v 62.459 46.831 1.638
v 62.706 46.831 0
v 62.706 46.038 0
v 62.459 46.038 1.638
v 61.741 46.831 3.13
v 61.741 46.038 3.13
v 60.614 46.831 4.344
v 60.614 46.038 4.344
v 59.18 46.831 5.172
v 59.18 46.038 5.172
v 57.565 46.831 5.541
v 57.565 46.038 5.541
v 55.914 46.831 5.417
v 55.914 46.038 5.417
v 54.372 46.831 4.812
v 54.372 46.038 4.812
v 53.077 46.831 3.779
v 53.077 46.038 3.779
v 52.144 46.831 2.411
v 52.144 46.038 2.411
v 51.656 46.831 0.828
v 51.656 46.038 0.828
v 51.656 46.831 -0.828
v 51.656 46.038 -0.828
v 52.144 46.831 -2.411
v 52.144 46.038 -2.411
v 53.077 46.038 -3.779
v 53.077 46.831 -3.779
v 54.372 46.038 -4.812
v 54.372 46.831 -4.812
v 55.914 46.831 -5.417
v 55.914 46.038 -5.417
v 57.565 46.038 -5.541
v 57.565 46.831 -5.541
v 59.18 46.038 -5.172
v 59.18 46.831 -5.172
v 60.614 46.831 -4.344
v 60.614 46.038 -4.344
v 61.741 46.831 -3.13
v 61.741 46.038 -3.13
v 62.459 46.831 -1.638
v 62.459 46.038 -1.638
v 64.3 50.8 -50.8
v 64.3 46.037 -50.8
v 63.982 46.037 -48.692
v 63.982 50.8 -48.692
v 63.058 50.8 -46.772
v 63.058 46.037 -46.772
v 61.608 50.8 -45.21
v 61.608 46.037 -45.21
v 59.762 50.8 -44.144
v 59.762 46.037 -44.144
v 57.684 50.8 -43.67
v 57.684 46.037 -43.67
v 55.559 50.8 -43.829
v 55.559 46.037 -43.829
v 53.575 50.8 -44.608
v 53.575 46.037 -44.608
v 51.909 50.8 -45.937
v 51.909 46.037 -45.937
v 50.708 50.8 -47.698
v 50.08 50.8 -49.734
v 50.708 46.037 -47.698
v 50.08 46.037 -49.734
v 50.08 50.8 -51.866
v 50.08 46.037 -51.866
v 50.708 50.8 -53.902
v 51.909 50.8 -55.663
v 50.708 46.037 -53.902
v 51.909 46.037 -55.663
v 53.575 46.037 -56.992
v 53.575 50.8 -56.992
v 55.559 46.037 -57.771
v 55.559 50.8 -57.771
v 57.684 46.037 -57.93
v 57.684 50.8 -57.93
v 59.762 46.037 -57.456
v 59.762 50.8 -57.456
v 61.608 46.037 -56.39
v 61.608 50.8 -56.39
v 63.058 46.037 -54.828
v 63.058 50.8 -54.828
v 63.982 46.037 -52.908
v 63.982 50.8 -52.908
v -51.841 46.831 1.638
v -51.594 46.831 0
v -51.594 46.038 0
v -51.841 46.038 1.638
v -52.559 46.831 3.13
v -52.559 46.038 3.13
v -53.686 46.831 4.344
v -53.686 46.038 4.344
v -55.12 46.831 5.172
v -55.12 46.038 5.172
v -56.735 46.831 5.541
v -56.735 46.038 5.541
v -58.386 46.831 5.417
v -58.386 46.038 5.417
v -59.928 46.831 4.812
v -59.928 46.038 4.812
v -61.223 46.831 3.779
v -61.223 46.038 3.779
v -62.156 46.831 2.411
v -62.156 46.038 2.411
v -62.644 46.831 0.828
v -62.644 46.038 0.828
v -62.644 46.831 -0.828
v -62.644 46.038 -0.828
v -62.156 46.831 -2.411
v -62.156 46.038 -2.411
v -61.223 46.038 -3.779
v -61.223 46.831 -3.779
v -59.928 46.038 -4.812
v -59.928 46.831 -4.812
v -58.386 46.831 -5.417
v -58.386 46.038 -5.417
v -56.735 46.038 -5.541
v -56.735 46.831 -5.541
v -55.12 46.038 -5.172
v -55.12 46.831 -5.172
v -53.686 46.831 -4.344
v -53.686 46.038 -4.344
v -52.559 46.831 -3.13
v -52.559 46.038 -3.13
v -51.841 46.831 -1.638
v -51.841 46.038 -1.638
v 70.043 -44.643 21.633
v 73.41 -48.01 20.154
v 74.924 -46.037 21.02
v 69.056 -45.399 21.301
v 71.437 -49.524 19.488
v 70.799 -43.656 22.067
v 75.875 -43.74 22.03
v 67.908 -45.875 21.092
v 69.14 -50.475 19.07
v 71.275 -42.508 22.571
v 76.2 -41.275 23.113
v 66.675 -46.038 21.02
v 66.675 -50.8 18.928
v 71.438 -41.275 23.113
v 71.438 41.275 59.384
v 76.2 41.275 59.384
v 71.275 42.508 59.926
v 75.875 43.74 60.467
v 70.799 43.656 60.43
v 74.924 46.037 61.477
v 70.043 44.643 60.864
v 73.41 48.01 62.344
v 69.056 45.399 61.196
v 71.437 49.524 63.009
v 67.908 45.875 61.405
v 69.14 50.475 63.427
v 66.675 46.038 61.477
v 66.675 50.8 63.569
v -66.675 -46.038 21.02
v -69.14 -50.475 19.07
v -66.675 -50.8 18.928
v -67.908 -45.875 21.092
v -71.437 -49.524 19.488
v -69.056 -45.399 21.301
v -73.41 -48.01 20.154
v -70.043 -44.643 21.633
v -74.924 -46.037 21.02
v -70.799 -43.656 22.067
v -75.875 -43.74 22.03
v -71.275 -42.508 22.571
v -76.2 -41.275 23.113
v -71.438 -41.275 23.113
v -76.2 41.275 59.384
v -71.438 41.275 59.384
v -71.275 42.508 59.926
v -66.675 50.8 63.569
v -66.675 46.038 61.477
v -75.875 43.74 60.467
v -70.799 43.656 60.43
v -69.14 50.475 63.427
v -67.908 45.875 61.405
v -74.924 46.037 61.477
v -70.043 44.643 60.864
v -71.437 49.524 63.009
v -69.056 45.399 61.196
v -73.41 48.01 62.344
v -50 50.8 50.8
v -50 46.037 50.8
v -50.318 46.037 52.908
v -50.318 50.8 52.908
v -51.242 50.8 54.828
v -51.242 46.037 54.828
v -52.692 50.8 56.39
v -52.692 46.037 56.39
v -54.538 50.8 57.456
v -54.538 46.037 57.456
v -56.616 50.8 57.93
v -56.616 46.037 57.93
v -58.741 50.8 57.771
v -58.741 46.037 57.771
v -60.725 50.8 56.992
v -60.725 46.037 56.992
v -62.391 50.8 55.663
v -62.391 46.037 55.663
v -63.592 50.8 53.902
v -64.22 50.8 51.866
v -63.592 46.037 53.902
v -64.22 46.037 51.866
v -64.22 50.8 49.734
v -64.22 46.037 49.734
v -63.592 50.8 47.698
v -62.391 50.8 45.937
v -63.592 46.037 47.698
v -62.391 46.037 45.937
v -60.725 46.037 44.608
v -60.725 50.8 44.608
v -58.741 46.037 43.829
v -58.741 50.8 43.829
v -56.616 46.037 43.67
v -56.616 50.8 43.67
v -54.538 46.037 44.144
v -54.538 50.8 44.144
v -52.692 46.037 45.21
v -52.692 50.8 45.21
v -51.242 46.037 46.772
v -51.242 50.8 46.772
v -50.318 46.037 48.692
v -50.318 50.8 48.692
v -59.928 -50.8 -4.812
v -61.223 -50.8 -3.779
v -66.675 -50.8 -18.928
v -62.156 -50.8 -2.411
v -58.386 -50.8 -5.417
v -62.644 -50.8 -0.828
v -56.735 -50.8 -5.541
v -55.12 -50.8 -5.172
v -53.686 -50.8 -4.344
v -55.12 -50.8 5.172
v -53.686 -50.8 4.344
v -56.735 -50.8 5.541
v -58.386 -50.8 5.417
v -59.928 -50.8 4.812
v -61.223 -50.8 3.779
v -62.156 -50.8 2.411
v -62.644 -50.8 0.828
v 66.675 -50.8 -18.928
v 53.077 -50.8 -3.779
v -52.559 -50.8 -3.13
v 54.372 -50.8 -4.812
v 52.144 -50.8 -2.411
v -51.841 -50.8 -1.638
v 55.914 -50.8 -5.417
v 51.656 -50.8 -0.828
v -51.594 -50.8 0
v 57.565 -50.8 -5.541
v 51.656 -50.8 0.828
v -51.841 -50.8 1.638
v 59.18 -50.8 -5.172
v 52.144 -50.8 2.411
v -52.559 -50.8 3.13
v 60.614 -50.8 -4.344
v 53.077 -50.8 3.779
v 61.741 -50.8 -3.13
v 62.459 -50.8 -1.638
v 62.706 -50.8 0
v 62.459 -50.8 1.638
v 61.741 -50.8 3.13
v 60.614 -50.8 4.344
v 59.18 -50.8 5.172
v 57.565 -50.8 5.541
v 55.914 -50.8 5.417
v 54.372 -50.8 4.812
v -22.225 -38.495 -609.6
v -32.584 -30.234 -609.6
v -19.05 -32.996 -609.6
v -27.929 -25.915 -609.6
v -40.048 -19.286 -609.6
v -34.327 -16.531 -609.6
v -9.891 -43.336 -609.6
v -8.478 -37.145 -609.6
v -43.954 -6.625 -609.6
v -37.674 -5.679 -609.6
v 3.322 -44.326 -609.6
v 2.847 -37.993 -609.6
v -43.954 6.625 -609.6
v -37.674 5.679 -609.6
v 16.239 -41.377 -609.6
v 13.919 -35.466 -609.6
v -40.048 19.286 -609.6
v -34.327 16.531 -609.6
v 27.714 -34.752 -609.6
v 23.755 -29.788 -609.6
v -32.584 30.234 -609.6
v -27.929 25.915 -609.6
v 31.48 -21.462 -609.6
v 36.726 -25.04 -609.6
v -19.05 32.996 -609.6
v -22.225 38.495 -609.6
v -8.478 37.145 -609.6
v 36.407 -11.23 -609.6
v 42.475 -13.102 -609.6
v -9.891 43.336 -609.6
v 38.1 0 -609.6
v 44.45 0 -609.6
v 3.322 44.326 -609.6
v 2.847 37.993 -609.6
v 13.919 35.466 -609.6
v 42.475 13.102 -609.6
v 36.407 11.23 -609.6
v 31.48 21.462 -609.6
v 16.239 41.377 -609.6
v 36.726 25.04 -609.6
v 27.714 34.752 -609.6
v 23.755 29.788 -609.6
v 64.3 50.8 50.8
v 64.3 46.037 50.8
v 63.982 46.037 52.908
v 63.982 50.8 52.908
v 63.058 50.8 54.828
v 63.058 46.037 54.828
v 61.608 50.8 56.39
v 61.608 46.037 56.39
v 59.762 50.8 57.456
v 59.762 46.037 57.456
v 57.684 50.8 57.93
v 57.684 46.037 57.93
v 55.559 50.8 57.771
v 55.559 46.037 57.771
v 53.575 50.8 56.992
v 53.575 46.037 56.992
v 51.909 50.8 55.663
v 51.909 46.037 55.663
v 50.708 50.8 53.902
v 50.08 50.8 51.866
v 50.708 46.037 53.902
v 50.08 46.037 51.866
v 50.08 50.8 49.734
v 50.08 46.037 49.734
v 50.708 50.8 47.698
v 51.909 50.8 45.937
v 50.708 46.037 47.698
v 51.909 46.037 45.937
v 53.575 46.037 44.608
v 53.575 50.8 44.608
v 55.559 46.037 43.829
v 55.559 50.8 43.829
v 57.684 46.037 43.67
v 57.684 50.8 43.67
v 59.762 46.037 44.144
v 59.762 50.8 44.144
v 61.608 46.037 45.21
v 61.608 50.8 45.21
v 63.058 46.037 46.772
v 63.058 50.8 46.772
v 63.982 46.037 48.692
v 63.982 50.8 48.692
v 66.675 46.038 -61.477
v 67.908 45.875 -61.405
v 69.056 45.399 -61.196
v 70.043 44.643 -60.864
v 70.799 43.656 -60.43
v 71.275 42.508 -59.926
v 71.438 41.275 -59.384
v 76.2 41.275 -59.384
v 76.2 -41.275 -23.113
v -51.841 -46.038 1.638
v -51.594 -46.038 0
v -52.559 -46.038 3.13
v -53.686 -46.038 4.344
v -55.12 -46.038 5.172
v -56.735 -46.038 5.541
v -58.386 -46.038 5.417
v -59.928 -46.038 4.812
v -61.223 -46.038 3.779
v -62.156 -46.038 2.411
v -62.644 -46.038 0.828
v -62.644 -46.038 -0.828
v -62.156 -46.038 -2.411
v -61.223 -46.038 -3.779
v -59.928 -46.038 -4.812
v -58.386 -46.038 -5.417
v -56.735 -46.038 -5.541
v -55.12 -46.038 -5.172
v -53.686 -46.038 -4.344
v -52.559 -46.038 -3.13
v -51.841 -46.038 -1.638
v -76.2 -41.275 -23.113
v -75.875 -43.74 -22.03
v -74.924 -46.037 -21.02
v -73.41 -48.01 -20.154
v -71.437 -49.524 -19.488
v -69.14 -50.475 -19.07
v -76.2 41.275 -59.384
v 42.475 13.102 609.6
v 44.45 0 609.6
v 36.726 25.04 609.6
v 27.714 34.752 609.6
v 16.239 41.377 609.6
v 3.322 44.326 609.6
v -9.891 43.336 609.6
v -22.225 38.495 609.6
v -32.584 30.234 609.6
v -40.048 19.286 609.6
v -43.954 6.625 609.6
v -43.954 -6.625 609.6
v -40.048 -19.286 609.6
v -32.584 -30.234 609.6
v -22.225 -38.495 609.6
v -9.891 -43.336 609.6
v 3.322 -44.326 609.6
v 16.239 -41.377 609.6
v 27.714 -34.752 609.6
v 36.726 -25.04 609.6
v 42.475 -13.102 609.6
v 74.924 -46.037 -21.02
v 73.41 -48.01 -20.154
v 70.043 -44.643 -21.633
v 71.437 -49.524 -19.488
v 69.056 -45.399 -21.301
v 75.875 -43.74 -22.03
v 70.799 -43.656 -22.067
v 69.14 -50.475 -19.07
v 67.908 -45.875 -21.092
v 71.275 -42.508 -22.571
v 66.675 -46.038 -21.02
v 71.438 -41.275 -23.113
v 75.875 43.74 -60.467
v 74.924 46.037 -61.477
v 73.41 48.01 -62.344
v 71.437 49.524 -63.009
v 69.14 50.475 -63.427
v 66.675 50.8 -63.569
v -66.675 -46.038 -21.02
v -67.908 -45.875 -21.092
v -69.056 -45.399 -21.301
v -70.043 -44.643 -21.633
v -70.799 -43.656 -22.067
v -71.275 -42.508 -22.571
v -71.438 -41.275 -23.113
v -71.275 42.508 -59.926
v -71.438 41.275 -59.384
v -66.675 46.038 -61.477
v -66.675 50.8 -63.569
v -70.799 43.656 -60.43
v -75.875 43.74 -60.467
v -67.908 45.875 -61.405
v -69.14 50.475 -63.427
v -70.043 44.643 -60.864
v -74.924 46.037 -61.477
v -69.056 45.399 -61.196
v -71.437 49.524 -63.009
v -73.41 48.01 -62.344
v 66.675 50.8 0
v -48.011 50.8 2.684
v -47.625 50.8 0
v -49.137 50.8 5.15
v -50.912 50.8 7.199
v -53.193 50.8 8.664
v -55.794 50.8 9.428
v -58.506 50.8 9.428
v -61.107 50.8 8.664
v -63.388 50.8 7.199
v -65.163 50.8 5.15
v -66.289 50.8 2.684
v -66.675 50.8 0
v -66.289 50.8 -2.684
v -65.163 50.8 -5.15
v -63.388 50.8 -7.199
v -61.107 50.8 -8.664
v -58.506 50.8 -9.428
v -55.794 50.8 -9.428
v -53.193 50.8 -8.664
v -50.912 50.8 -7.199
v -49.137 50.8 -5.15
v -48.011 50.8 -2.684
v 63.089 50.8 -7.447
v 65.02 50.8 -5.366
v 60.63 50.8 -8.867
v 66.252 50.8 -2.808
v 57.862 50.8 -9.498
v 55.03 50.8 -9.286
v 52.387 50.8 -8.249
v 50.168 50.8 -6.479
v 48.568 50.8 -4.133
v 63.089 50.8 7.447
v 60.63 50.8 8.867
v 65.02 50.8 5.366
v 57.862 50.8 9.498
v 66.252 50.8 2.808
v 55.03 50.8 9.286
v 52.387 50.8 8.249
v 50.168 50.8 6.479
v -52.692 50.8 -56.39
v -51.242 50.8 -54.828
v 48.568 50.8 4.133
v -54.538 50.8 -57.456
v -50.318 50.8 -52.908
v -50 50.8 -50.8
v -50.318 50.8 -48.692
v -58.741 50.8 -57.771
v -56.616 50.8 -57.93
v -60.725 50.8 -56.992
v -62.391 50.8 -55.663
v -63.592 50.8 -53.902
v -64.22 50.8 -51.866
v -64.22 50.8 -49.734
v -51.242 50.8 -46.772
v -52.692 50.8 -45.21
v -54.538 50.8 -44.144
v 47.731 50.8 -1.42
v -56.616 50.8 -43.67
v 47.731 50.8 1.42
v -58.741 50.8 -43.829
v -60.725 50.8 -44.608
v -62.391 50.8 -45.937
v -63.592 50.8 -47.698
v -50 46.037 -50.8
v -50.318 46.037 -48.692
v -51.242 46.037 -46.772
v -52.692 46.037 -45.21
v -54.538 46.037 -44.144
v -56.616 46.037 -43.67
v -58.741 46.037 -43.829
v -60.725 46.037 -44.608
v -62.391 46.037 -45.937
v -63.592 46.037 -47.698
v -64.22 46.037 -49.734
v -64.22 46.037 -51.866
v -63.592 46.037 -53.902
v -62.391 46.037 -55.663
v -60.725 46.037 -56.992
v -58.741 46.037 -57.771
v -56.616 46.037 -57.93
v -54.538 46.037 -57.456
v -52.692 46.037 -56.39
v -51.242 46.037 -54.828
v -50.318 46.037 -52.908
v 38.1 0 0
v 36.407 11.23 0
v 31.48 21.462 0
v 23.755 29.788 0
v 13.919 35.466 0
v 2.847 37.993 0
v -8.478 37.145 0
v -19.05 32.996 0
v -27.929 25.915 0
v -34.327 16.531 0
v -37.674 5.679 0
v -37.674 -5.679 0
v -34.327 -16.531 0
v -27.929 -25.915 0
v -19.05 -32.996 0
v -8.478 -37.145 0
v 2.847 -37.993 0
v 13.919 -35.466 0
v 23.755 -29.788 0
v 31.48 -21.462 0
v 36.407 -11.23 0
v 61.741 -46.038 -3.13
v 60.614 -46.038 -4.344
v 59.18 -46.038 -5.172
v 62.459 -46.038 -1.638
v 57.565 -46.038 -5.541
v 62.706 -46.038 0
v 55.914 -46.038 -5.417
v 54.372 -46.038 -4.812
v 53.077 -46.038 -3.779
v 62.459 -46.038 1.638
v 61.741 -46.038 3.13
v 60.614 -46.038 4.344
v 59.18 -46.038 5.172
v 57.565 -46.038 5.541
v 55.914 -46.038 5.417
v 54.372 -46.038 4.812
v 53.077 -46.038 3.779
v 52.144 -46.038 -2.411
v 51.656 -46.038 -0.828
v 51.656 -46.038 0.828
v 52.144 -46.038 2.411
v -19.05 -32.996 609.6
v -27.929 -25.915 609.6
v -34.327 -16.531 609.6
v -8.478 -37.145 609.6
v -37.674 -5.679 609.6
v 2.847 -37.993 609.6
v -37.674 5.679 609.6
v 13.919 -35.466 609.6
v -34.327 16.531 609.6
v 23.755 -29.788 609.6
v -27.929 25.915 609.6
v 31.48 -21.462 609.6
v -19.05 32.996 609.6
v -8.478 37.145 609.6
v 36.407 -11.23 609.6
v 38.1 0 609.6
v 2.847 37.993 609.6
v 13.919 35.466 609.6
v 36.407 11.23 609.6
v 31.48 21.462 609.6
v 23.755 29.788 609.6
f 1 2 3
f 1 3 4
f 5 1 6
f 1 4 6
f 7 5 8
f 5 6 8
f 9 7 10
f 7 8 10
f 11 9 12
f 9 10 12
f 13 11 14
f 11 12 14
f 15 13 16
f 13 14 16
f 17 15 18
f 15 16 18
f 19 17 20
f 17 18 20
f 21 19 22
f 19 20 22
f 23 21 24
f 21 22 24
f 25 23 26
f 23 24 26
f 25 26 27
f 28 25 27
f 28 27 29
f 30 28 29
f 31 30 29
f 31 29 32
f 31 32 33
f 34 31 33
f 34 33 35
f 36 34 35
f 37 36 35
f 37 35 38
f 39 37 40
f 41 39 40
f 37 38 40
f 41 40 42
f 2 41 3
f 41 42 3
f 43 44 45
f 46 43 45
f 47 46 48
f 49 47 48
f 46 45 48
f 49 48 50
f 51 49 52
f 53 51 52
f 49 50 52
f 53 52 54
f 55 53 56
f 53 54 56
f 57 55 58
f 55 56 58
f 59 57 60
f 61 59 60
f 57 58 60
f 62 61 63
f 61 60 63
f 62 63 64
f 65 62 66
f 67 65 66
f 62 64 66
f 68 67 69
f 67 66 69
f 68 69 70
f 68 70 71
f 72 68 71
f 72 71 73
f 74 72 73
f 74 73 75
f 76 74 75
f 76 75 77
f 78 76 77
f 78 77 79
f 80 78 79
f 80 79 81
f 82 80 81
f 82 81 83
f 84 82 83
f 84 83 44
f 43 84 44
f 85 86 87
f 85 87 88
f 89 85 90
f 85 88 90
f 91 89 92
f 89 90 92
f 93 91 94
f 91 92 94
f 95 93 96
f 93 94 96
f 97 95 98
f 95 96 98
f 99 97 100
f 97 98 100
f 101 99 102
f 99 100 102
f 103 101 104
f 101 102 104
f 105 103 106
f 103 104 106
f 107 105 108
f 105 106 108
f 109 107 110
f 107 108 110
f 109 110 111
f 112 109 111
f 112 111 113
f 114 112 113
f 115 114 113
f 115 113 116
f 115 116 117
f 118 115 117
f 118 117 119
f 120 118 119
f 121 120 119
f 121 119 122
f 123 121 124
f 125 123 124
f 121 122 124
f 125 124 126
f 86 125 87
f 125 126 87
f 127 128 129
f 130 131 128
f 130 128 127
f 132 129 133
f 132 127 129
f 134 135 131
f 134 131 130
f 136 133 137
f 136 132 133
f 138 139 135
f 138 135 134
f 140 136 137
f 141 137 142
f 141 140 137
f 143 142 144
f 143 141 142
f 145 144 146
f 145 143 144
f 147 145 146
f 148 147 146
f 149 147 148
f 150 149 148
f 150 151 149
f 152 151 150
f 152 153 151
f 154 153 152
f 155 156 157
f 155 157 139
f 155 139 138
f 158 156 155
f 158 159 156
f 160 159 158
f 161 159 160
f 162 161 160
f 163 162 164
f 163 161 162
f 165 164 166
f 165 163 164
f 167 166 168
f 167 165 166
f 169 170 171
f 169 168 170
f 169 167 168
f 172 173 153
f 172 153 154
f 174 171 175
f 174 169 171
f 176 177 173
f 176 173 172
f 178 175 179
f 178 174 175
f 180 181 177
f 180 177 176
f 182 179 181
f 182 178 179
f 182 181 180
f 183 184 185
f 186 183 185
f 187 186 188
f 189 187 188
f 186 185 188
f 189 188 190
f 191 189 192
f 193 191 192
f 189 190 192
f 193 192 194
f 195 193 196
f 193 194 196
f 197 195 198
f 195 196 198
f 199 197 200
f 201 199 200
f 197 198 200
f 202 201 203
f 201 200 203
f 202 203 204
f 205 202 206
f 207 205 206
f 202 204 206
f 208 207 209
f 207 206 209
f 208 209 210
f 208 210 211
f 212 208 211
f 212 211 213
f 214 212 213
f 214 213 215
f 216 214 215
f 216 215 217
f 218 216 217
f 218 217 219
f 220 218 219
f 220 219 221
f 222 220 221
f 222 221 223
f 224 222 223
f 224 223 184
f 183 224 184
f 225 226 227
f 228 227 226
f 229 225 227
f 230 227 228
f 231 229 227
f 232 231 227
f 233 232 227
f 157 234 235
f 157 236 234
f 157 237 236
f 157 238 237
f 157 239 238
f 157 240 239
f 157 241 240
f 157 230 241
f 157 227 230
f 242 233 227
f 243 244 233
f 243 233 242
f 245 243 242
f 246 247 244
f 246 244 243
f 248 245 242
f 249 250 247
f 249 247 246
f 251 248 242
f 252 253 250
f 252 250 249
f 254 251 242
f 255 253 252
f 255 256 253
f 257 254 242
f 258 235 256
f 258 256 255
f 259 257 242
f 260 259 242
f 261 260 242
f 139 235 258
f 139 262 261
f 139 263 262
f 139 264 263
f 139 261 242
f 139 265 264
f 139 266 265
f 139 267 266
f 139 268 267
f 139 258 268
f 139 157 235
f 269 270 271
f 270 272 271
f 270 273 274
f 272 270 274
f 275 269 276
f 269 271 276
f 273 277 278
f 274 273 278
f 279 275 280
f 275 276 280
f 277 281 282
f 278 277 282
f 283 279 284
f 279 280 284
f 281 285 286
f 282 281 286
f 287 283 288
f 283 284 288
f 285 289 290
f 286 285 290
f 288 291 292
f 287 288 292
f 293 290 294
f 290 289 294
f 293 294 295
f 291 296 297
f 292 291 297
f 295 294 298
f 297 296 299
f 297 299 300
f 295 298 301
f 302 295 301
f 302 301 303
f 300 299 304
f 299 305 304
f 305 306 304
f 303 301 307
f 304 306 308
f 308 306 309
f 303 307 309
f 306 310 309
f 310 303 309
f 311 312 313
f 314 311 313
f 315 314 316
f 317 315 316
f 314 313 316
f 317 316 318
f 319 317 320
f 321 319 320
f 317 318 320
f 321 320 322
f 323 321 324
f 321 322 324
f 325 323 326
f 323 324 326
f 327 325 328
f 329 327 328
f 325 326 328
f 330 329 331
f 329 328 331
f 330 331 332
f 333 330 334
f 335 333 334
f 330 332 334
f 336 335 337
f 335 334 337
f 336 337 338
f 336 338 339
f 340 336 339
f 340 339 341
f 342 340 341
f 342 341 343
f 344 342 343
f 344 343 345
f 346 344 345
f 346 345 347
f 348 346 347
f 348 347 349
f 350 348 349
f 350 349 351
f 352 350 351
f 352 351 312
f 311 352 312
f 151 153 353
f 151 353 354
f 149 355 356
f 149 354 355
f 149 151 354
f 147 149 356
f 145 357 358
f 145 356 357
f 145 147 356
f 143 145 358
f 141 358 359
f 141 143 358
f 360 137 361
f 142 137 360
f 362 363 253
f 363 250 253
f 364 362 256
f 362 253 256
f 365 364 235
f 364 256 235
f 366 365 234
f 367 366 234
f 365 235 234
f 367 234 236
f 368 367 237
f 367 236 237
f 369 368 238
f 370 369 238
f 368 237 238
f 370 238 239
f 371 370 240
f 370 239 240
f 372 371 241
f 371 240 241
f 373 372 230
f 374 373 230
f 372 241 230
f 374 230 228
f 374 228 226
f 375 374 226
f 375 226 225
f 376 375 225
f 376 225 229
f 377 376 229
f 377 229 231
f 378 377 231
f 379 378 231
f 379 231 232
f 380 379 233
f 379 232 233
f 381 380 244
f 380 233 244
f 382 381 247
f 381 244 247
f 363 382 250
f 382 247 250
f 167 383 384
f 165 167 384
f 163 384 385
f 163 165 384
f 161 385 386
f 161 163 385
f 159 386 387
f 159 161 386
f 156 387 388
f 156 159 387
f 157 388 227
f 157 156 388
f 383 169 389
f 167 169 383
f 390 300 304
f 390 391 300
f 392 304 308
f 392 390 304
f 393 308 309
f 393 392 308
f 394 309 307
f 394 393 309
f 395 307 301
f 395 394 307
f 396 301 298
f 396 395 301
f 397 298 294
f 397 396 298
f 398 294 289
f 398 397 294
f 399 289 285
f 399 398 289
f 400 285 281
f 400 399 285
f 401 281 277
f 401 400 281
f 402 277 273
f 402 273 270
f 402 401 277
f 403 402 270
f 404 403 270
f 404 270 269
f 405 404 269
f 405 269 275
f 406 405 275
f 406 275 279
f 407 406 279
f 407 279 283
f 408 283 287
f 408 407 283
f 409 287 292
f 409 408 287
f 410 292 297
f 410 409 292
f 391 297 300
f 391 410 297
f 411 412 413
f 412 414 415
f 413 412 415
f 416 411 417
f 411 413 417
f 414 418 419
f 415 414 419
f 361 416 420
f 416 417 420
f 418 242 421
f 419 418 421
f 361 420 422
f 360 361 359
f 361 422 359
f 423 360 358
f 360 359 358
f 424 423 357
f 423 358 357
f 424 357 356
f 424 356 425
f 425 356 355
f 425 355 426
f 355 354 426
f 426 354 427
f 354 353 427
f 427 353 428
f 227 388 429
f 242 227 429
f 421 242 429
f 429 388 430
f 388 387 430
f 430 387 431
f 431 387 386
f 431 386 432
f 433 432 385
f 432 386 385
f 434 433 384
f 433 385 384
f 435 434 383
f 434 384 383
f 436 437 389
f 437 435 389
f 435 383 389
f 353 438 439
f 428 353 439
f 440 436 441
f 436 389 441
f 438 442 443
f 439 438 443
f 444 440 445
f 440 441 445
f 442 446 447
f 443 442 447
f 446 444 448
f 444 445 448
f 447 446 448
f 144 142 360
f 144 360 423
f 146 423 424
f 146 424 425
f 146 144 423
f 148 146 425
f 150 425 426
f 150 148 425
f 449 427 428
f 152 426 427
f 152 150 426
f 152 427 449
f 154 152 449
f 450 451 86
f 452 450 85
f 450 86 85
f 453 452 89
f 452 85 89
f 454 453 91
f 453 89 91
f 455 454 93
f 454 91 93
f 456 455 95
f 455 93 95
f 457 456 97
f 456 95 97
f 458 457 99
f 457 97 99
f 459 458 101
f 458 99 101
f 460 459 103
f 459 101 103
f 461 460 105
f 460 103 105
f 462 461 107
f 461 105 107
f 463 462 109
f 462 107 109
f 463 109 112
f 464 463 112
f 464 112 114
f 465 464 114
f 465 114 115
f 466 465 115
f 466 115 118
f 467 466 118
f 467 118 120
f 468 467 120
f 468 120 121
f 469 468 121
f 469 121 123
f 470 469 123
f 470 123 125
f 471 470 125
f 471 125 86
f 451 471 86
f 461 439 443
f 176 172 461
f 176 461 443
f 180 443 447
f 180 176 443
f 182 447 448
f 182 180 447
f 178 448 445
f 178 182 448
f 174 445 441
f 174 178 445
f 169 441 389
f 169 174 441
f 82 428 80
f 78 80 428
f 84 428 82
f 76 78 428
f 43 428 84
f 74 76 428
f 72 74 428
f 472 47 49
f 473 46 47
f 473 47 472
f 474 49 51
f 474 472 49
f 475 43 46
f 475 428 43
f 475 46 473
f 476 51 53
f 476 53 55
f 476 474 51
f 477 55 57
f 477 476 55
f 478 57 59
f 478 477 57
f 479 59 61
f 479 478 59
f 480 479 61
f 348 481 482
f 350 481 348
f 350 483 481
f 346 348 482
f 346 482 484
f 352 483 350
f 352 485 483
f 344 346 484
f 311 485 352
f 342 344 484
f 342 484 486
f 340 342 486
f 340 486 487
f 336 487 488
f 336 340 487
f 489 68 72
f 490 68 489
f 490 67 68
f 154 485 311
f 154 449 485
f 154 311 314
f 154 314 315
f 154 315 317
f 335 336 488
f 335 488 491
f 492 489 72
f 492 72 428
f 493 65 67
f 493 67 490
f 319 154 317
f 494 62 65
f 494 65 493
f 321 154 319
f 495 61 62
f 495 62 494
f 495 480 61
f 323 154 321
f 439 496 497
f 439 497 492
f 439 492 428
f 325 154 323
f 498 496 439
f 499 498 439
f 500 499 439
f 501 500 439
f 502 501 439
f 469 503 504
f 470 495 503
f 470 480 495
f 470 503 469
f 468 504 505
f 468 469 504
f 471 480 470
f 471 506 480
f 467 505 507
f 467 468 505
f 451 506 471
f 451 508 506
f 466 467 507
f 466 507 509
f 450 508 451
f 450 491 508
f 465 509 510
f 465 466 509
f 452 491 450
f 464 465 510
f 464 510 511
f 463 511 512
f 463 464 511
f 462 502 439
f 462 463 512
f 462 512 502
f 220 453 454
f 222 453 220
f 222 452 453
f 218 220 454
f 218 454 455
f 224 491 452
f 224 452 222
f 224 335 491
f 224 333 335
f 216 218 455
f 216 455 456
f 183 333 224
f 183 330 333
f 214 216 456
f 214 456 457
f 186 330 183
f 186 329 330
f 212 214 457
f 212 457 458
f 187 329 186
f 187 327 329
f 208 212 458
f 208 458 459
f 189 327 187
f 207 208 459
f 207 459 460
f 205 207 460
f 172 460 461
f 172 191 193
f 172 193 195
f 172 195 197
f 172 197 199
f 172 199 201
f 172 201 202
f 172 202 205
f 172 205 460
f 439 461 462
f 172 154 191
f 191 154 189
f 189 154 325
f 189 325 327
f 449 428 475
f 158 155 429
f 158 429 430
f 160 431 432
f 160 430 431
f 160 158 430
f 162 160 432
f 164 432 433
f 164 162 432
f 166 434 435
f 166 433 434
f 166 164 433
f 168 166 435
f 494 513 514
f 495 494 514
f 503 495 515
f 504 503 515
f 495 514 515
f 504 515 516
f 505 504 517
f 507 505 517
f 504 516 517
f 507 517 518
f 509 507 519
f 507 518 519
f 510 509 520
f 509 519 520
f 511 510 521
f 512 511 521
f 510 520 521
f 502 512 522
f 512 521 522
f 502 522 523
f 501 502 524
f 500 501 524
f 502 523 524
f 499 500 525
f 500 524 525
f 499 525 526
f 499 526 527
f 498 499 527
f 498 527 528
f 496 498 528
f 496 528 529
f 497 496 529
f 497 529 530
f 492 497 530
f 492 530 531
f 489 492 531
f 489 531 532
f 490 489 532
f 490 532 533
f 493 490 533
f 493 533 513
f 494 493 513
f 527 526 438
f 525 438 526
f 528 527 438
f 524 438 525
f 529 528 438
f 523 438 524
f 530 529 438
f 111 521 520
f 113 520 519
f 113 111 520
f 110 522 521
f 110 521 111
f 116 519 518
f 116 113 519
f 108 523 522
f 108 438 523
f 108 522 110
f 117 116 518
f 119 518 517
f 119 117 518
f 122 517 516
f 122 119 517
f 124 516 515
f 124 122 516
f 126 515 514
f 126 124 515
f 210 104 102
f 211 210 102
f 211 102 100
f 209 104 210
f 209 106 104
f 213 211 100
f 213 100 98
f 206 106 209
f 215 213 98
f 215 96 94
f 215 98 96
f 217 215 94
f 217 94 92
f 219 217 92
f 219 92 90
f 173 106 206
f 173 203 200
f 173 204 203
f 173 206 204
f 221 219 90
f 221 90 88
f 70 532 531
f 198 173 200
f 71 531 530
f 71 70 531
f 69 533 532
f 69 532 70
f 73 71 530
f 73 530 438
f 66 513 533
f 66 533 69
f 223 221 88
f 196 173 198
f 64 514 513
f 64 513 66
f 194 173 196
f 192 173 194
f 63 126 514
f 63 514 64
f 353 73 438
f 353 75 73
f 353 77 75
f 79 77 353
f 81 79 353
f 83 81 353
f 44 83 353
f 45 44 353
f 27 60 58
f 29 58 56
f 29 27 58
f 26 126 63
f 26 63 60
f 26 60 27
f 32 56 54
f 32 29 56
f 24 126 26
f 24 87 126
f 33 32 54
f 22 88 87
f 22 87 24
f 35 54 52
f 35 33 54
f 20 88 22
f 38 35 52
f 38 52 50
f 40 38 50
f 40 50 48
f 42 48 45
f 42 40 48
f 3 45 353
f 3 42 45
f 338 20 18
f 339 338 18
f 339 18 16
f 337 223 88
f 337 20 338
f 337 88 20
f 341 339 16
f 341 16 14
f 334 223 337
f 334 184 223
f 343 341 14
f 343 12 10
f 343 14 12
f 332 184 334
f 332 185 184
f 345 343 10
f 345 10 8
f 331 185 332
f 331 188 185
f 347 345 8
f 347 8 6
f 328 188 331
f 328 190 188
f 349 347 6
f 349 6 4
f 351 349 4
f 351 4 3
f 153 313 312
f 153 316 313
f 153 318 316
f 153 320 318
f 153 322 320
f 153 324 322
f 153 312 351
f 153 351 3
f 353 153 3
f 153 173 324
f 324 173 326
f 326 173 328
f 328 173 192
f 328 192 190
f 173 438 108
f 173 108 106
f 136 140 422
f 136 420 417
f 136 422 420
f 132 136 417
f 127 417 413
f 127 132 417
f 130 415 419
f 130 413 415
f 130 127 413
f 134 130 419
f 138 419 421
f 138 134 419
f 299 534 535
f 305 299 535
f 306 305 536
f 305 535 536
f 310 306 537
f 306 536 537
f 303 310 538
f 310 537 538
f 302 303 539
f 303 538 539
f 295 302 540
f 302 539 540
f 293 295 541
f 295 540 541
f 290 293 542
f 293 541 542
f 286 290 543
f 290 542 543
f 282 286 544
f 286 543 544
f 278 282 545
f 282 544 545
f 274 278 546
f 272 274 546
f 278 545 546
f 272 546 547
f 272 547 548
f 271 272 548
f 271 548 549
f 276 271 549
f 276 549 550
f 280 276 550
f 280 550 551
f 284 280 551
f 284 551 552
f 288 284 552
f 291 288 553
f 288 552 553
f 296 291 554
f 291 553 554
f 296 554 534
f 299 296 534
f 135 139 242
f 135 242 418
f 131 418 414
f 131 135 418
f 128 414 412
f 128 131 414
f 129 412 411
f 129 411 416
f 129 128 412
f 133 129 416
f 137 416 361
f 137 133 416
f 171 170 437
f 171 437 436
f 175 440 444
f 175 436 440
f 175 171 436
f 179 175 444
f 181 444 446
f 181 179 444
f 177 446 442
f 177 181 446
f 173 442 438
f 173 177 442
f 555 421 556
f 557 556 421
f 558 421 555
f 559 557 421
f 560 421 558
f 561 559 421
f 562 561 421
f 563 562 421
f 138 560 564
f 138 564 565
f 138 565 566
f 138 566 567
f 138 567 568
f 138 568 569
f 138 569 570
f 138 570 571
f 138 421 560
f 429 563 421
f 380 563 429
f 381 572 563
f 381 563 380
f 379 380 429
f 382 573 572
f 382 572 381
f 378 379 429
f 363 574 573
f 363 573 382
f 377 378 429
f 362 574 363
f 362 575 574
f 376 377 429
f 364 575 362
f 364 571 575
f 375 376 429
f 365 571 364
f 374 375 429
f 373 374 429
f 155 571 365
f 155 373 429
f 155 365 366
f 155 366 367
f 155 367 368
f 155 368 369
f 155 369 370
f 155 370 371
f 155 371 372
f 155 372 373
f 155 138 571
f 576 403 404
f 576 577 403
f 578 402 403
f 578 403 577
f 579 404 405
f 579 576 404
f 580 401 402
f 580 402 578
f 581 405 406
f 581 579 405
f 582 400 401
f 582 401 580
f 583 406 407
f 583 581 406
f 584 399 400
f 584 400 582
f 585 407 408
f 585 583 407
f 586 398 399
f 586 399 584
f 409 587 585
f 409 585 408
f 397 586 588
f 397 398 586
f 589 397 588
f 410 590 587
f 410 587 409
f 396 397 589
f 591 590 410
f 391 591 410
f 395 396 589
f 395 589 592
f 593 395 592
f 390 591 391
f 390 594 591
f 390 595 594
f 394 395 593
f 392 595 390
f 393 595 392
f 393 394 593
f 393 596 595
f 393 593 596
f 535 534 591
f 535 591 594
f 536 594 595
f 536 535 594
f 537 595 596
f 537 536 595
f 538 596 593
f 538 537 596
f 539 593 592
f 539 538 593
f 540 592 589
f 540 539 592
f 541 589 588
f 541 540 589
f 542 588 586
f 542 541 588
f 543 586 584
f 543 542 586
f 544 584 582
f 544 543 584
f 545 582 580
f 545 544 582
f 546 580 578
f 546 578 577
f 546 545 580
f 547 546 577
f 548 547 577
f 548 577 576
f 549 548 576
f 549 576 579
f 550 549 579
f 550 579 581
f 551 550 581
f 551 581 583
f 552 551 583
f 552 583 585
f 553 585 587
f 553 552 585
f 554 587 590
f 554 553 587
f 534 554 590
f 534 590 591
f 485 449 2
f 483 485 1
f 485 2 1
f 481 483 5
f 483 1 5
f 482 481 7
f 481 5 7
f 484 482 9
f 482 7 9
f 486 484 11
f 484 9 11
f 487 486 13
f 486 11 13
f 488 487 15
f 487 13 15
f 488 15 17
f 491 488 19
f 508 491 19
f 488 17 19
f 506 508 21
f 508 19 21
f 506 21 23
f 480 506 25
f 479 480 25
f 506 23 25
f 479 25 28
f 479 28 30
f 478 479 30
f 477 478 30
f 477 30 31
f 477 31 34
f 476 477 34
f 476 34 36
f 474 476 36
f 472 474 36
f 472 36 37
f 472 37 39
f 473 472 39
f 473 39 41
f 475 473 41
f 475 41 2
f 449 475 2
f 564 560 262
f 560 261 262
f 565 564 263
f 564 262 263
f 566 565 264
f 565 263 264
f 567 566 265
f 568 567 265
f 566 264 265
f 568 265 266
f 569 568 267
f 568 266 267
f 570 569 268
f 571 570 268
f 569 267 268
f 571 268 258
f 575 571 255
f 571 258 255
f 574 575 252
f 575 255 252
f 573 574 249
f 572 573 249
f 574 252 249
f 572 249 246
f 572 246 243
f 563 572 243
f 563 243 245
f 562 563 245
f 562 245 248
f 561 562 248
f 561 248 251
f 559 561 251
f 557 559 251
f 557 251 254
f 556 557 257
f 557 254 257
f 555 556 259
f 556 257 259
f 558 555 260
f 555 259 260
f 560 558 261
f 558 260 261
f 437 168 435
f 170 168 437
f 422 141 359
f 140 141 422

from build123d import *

# Parameters (mm, degrees)
F5_REACH        = 246.7313465507
F7_R            = 44.45
F7_R_2          = 38.1000004709
F8_DEPTH        = 609.6
F8_DEPTH_BACK   = 609.6
F10_D           = 14.3002
F11_D           = 11.1125
F11_CSINK_D     = 19.05
F11_CSINK_ANGLE = 90


with BuildPart() as f5:
    f5_end = Plane(origin=(0, 50.6421849132, 63.5), x_dir=(0, 0.9155220939, 0.4022676914), z_dir=(0, -0.4022676914, 0.9155220939))
    # F0 (on Top) → F5 (new body, up to a plane its end follows)
    with BuildSketch(Plane.XY):
        with BuildLine():
            ThreePointArc((76.2, 41.275), (73.4101920908, 48.0101920908), (66.675, 50.8))
            Line((66.675, 50.8), (-66.675, 50.8))
            ThreePointArc((-66.675, 50.8), (-73.4101920908, 48.0101920908), (-76.2, 41.275))
            Line((-76.2, 41.275), (-76.2, -41.275))
            ThreePointArc((-76.2, -41.275), (-73.4101920908, -48.0101920908), (-66.675, -50.8))
            Line((-66.675, -50.8), (66.675, -50.8))
            ThreePointArc((66.675, -50.8), (73.4101920908, -48.0101920908), (76.2, -41.275))
            Line((76.2, -41.275), (76.2, 41.275))
        make_face()
        with BuildLine():
            ThreePointArc((66.675, 46.0375), (70.0425960454, 44.6425960454), (71.4375, 41.275))
            Line((71.4375, 41.275), (71.4375, -41.275))
            ThreePointArc((71.4375, -41.275), (70.0425960454, -44.6425960454), (66.675, -46.0375))
            Line((66.675, -46.0375), (-66.675, -46.0375))
            ThreePointArc((-66.675, -46.0375), (-70.0425960454, -44.6425960454), (-71.4375, -41.275))
            Line((-71.4375, -41.275), (-71.4375, 41.275))
            ThreePointArc((-71.4375, 41.275), (-70.0425960454, 44.6425960454), (-66.675, 46.0375))
            Line((-66.675, 46.0375), (66.675, 46.0375))
        make_face(mode=Mode.SUBTRACT)
    f5_long = extrude(amount=F5_REACH, mode=Mode.PRIVATE)
    add(split(f5_long, bisect_by=f5_end, keep=Keep.BOTTOM, mode=Mode.PRIVATE))

    # F6: F5 across plane


with BuildPart() as f5_1:
    add(f5.part)
    add(f5.part.mirror(Plane.XY))

    # F10 (through all)
    with Locations(Plane(origin=(0, 50.8, 0), x_dir=(-1, 0, 0), z_dir=(0, 1, 0))):
        with Locations((-57.15, 50.8), (57.15, 50.8), (57.15, -50.8), (-57.15, -50.8)):
            Hole(F10_D / 2)

    # F11 (through all)
    with Locations(Plane(origin=(0, 50.8, 0), x_dir=(-1, 0, 0), z_dir=(0, 1, 0))):
        with Locations((-57.15, 0), (57.15, 0)):
            CounterSinkHole(F11_D / 2, F11_CSINK_D / 2, counter_sink_angle=F11_CSINK_ANGLE)


with BuildPart() as f8:
    # F7 (on Top) → F8 (new body, two sides)
    with BuildSketch(Plane.XY) as f8_sk:
        Circle(F7_R)
        Circle(F7_R_2, mode=Mode.SUBTRACT)
    extrude(amount=F8_DEPTH)
    extrude(f8_sk.sketch, amount=-F8_DEPTH_BACK)


solid = Compound([f5_1.part, f8.part])
